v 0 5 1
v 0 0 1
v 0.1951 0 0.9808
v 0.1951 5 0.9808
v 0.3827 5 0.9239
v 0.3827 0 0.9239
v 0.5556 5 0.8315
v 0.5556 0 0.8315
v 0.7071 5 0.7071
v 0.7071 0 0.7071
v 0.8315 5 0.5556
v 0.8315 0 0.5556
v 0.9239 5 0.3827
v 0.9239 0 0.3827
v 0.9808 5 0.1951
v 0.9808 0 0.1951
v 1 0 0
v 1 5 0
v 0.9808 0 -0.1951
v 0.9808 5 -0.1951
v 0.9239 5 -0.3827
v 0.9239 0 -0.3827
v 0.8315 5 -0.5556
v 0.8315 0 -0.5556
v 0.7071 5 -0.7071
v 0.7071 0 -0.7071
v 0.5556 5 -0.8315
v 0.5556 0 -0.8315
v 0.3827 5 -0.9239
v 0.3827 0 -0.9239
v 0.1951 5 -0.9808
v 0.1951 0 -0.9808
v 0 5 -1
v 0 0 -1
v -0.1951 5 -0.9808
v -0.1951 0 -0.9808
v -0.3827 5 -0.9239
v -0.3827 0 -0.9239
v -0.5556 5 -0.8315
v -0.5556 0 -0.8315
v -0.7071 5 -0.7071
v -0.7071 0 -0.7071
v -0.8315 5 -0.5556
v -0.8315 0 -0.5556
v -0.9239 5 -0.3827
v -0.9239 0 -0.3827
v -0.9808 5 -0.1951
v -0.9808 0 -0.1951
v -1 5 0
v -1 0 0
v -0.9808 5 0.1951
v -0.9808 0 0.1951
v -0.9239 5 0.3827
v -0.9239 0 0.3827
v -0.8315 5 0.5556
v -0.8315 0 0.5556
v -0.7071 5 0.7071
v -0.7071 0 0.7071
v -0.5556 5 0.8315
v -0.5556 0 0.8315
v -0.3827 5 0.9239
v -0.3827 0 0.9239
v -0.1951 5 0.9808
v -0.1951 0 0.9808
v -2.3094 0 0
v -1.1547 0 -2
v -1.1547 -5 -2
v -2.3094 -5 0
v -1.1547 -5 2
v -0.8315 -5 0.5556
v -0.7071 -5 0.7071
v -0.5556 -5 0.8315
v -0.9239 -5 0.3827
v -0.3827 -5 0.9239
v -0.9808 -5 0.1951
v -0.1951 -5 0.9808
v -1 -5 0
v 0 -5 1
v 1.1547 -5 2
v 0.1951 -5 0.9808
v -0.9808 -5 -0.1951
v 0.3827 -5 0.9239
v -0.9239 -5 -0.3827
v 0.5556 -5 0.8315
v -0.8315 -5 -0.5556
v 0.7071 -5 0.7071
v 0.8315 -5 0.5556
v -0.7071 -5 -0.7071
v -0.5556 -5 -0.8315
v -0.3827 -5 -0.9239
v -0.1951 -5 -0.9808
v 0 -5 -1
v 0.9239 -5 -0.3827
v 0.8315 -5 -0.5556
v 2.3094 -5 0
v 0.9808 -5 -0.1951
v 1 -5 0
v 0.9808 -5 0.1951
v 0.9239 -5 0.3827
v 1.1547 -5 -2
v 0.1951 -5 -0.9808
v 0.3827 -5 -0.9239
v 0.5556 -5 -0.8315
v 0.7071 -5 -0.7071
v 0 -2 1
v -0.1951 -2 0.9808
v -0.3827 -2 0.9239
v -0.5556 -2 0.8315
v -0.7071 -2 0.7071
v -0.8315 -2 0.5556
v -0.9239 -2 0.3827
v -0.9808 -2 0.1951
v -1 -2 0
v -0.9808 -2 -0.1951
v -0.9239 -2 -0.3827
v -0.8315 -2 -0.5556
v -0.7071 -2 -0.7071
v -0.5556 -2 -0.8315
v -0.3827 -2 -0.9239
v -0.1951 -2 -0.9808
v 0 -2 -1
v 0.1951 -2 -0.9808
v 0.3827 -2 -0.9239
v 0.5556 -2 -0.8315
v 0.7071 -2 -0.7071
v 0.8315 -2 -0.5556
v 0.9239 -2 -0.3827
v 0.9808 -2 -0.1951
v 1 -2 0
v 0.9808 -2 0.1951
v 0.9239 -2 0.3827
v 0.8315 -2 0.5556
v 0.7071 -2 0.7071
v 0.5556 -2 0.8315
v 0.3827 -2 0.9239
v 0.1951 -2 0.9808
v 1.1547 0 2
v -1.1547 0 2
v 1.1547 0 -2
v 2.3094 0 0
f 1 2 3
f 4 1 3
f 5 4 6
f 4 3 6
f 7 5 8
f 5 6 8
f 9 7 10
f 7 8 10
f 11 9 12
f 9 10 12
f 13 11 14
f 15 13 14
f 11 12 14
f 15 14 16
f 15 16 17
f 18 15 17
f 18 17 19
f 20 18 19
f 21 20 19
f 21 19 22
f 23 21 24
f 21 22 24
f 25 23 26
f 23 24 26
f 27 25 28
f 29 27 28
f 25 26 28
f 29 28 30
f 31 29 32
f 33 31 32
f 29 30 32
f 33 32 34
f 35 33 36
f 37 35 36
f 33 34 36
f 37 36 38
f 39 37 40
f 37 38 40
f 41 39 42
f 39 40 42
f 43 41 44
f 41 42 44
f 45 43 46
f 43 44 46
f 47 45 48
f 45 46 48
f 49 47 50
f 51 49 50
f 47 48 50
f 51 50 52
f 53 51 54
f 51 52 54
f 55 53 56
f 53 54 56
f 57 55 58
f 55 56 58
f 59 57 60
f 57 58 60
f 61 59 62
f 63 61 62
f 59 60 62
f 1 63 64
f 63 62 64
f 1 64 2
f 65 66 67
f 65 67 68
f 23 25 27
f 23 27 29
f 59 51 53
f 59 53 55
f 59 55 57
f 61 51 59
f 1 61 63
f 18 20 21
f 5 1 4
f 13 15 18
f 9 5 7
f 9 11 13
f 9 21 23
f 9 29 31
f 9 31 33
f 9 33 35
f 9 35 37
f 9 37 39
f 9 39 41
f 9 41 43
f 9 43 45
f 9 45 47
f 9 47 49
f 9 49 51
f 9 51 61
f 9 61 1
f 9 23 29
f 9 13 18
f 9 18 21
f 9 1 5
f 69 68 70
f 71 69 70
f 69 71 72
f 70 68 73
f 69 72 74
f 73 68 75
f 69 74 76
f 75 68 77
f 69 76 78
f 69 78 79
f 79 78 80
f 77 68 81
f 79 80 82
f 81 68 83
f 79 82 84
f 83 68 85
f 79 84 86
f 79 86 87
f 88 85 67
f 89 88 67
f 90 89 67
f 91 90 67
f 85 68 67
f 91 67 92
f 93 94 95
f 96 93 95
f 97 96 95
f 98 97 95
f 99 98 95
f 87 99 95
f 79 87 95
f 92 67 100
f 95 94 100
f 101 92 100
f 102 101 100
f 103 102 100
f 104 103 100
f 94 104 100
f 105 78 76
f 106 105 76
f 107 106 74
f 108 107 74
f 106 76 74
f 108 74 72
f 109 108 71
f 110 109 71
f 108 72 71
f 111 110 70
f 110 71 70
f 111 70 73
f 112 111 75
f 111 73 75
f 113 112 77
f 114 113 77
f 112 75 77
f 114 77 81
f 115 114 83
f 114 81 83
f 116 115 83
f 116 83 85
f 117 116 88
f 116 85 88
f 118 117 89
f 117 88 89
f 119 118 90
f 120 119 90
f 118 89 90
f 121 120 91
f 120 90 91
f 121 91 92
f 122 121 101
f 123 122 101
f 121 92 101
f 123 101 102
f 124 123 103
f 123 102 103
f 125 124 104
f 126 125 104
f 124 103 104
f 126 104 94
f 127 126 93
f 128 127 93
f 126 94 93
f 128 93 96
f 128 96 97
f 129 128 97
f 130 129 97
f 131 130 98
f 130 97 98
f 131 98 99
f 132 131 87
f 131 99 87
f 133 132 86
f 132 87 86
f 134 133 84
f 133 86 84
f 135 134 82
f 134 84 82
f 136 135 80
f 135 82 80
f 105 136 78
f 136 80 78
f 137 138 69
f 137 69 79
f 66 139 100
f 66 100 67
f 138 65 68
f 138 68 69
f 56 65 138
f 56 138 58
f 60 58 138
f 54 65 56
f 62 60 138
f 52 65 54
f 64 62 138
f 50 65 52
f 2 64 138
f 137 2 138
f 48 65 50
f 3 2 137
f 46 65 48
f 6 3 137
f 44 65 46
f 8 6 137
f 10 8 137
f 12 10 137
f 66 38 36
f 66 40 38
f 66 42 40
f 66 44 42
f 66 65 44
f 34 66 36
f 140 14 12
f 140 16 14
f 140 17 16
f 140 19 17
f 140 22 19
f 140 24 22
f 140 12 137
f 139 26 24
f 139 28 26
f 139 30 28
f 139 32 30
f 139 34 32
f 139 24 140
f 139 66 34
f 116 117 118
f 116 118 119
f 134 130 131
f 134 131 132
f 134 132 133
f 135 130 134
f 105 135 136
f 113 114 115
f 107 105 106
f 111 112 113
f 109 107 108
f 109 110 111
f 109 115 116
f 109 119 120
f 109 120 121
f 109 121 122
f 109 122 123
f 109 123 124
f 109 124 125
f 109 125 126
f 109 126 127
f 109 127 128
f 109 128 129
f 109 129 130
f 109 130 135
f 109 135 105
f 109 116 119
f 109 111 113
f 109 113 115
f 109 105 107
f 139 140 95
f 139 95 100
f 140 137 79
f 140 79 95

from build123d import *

# Parameters (mm, degrees)
SKETCH1_R           = 1
BOSS_EXTRUDE1_DEPTH = 5
BOSS_EXTRUDE2_DEPTH = 5
SKETCH3_R           = 1
CUT_EXTRUDE1_DEPTH  = 3


with BuildPart() as part:
    # Sketch1 → Boss-Extrude1 (new body)
    with BuildSketch(Plane(origin=(0, 0, 0), x_dir=(1, 0, 0), z_dir=(0, 1, 0))):
        with Locations(Location((0, 0, 0), (0, 0, 270))):
            Circle(SKETCH1_R)
    extrude(amount=BOSS_EXTRUDE1_DEPTH)

    # Sketch2 → Boss-Extrude2 (add)
    with BuildSketch(Plane(origin=(0, 0, 0), x_dir=(1, 0, 0), z_dir=(0, 1, 0))):
        Polygon((2.309401077, 0), (1.154700538, 2), (-1.154700538, 2), (-2.309401077, 0), (-1.154700538, -2), (1.154700538, -2), align=None)
    extrude(amount=-BOSS_EXTRUDE2_DEPTH)

    # Sketch3 → Cut-Extrude1 (cut)
    with BuildSketch(Plane.XZ.offset(5)):
        with Locations(Location((0, 0, 0), (0, 0, 90))):
            Circle(SKETCH3_R)
    extrude(amount=-CUT_EXTRUDE1_DEPTH, mode=Mode.SUBTRACT)


solid = part.part
